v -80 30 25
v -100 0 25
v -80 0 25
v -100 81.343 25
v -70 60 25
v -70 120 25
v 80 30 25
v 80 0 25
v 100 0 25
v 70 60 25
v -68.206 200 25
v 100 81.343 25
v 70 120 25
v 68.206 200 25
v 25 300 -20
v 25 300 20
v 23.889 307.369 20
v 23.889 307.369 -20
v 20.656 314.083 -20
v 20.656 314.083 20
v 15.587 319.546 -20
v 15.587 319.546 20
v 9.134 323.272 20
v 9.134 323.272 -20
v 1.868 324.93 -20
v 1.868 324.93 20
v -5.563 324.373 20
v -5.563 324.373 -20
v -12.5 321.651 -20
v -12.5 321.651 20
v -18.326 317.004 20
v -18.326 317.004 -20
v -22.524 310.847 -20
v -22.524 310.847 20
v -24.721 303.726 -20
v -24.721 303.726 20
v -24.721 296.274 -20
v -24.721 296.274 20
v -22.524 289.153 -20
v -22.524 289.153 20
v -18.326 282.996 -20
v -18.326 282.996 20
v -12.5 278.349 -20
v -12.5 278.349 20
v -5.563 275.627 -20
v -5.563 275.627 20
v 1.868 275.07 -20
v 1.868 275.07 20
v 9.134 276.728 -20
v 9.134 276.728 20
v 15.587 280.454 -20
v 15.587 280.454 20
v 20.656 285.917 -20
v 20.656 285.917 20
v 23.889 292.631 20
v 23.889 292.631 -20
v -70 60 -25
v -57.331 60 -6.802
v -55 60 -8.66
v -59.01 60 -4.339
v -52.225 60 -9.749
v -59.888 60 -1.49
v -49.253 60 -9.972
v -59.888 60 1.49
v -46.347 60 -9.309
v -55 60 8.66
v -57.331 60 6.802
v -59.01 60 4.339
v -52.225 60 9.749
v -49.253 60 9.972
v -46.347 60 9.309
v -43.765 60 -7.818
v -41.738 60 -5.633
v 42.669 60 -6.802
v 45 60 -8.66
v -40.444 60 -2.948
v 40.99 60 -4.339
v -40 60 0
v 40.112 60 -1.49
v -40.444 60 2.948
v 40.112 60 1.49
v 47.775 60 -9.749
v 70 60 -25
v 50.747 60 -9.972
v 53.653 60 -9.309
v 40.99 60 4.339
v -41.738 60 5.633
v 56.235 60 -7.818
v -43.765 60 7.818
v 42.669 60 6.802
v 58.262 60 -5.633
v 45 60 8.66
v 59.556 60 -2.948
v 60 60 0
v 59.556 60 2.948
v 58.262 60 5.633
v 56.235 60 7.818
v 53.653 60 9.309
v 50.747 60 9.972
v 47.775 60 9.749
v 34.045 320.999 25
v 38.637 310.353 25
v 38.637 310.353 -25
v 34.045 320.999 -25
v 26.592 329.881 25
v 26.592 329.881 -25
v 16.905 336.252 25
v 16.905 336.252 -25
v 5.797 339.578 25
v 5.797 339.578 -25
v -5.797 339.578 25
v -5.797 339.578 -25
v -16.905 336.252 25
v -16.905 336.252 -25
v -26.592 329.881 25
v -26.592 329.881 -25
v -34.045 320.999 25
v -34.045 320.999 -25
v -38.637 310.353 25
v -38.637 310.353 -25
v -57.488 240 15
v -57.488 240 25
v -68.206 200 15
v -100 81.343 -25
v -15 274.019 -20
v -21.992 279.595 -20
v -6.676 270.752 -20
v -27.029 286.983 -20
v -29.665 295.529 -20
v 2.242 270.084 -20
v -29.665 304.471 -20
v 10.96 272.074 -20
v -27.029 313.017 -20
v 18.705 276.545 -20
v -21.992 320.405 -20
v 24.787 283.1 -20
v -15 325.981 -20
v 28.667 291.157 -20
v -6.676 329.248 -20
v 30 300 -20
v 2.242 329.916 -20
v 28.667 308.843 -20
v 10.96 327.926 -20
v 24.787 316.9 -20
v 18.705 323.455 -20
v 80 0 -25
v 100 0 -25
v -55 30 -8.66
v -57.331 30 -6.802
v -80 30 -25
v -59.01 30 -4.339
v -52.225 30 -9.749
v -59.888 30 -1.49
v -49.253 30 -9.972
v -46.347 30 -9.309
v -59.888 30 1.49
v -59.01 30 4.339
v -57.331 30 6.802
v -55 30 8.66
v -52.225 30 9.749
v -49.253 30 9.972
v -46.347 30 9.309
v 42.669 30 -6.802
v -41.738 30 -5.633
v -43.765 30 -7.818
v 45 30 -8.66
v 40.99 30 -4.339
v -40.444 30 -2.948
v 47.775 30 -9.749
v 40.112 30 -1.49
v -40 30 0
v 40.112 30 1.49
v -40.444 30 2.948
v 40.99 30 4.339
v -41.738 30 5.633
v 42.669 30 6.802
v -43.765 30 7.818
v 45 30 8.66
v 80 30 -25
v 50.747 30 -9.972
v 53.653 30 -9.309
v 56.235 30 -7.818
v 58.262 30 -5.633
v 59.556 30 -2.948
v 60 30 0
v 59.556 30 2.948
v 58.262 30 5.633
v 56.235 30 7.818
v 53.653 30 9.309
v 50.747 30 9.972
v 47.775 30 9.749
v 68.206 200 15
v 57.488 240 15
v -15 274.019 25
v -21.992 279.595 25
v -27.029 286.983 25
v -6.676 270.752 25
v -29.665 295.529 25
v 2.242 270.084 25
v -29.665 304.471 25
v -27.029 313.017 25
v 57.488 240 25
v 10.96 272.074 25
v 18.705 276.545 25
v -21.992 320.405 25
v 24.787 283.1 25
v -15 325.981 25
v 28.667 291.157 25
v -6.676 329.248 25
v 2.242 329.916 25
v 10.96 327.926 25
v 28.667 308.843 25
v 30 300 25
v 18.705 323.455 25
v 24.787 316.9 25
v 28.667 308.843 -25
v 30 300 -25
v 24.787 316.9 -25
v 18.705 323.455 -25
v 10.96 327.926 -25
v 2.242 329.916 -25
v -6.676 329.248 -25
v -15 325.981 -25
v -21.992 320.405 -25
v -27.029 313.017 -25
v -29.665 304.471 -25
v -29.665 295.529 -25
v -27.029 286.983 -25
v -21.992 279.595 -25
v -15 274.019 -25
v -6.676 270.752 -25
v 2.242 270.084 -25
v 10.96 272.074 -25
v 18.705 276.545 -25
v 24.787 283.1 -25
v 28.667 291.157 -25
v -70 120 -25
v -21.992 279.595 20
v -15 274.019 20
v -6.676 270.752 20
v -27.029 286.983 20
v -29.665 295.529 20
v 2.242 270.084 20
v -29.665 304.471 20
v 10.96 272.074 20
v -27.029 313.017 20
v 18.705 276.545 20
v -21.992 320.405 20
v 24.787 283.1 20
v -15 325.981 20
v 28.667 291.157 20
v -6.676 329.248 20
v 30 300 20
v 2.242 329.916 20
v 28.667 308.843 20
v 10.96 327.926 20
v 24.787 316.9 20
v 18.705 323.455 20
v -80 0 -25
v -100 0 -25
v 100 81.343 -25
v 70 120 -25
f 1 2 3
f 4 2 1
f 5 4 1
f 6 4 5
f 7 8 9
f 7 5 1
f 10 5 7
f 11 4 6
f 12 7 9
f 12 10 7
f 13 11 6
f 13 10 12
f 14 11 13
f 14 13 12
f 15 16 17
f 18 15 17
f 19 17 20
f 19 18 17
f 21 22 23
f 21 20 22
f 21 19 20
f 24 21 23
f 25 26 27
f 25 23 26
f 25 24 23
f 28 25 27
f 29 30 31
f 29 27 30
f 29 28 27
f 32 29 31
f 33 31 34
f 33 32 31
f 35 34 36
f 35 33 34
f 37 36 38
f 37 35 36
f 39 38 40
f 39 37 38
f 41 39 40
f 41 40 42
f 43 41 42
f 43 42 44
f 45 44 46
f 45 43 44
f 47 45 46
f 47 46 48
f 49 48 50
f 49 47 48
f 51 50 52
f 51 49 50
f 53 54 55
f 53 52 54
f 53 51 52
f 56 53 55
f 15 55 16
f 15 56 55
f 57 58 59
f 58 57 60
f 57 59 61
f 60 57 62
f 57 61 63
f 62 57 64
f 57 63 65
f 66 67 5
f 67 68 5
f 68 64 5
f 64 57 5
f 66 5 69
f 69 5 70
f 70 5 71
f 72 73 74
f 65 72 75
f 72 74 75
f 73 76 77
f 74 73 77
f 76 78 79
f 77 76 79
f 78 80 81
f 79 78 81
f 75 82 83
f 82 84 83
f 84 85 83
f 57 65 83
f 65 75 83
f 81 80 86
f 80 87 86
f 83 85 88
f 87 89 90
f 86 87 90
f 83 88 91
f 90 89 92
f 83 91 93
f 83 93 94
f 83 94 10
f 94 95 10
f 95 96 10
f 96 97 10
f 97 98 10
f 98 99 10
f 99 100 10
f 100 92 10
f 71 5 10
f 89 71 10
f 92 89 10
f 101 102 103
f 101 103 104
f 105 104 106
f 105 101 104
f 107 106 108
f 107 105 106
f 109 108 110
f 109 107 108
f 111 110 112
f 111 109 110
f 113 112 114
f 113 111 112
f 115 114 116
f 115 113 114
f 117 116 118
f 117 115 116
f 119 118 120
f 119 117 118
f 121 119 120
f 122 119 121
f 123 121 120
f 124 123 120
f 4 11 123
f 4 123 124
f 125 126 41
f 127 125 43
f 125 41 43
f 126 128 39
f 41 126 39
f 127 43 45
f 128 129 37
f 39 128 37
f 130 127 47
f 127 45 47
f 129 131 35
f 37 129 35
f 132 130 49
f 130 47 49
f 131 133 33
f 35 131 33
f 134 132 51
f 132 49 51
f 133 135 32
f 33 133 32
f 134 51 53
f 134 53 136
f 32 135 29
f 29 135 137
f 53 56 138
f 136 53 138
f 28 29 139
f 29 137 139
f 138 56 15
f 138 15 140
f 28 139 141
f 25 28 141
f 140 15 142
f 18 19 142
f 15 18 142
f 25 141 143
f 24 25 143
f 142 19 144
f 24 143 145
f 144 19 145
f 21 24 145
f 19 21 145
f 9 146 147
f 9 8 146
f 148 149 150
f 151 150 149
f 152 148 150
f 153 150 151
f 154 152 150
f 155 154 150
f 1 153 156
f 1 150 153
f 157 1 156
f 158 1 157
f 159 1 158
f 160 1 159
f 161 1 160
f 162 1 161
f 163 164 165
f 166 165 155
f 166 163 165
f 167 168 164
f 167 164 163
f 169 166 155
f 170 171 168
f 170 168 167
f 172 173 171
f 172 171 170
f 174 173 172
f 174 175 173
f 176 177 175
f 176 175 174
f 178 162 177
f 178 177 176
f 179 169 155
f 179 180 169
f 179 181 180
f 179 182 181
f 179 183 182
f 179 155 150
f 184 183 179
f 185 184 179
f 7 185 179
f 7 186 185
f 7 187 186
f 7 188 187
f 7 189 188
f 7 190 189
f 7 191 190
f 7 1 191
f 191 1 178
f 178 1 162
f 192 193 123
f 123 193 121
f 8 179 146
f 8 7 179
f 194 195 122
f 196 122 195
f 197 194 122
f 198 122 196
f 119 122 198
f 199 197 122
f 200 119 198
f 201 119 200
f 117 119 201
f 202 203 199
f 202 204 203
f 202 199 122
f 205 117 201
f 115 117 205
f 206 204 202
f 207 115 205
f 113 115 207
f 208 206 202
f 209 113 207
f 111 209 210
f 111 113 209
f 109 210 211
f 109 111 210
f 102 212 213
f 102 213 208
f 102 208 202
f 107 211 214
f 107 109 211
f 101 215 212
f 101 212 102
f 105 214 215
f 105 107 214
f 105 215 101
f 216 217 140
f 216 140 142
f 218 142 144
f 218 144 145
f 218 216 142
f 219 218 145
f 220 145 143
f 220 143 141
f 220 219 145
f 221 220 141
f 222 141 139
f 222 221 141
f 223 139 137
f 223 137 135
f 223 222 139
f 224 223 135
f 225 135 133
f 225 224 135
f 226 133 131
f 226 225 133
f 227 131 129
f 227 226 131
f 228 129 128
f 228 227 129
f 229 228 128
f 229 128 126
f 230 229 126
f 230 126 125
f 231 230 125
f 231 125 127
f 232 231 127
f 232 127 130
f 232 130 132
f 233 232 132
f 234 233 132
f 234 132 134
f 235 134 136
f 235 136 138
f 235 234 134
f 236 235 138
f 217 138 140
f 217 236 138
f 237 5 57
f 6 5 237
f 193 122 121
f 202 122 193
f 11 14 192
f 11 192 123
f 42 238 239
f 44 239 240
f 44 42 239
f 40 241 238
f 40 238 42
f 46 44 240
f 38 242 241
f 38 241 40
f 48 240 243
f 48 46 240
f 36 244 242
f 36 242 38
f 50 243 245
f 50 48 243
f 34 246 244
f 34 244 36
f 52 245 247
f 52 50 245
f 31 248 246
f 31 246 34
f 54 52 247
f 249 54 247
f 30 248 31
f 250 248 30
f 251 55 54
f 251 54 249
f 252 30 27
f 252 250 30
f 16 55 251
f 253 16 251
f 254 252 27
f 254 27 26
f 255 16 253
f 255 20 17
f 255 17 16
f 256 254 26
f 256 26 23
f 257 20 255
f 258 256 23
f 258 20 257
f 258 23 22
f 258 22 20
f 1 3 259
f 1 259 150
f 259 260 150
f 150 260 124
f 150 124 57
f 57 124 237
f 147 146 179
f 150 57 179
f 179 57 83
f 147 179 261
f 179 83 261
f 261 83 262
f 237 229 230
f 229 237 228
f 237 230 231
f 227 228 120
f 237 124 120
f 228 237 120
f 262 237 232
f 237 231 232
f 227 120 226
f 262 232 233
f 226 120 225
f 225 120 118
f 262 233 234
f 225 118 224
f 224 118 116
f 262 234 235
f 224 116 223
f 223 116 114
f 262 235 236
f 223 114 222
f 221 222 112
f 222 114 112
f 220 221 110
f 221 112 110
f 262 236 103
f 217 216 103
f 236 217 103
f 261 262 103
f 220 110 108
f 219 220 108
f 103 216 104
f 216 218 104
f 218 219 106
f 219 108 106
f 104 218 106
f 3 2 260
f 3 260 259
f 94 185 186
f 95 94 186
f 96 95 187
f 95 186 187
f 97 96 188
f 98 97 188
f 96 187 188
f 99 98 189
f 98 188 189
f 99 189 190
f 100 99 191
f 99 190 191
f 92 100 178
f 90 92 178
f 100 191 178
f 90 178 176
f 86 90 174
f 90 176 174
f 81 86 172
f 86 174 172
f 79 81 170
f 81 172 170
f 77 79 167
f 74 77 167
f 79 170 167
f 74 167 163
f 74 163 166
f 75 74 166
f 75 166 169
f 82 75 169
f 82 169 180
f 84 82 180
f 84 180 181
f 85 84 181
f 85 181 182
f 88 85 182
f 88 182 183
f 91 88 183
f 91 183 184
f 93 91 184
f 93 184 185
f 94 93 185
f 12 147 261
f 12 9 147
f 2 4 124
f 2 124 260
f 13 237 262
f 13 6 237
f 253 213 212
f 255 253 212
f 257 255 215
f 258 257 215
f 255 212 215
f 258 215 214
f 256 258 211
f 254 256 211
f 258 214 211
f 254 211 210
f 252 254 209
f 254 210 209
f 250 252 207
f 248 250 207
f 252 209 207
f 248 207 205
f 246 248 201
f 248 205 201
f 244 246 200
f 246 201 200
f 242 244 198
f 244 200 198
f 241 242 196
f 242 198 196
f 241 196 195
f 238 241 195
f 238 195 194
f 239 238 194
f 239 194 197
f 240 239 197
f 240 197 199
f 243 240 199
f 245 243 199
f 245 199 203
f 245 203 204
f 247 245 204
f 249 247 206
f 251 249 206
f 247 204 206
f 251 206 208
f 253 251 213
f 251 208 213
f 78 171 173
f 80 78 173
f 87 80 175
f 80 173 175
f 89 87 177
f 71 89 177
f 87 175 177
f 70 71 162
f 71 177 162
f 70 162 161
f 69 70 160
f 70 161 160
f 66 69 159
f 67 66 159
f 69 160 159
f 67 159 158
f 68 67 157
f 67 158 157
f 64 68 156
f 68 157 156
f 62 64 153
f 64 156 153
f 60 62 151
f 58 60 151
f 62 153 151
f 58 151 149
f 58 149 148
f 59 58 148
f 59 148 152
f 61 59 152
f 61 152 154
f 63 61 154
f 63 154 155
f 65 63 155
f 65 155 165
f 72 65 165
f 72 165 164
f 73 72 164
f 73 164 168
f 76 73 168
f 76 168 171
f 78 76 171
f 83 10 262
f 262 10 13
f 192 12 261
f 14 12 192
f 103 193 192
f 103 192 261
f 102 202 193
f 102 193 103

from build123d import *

# Parameters (mm, degrees)
SKETCH1_R           = 25
SKETCH1_W           = 140
SKETCH1_H           = 60
BOSS_EXTRUDE1_DEPTH = 25
SKETCH4_R           = 30
CUT_EXTRUDE1_DEPTH  = 5
CUT_EXTRUDE2_DEPTH  = 10
CUT_EXTRUDE3_REACH  = 312
SKETCH6_R           = 10


with BuildPart() as part:
    # Sketch1 → Boss-Extrude1 (new body, symmetric)
    with BuildSketch(Plane.XY):
        with BuildLine():
            Line((100, 81.343051449), (38.637033052, 310.352761804))
            ThreePointArc((38.637033052, 310.352761804), (0, 340), (-38.637033052, 310.352761804))
            Line((-38.637033052, 310.352761804), (-100, 81.343051449))
            Line((-100, 81.343051449), (-100, 0))
            Line((-100, 0), (-80, 0))
            Line((-80, 0), (-80, 30))
            Line((-80, 30), (80, 30))
            Line((80, 30), (80, 0))
            Line((80, 0), (100, 0))
            Line((100, 0), (100, 81.343051449))
        make_face()
        with Locations((0, 300)):
            Circle(SKETCH1_R, mode=Mode.SUBTRACT)
        with Locations((0, 90)):
            Rectangle(SKETCH1_W, SKETCH1_H, mode=Mode.SUBTRACT)
    extrude(amount=BOSS_EXTRUDE1_DEPTH, both=True)

    # Sketch4 → Cut-Extrude1 (cut)
    with BuildSketch(Plane.XY.offset(25)):
        with Locations((0, 300)):
            Circle(SKETCH4_R)
    cut_extrude1 = extrude(amount=-CUT_EXTRUDE1_DEPTH, mode=Mode.SUBTRACT)

    # Mirror1: Cut-Extrude1 across plane
    add(cut_extrude1.mirror(Plane.XY), mode=Mode.SUBTRACT)

    # Sketch5 → Cut-Extrude2 (cut)
    with BuildSketch(Plane.XY.offset(25)):
        Polygon((-57.487998762, 240), (57.487998762, 240), (68.20596646, 200), (-68.20596646, 200), align=None)
    extrude(amount=-CUT_EXTRUDE2_DEPTH, mode=Mode.SUBTRACT)

    # Sketch6 → Cut-Extrude3 (cut, up to next)
    with BuildSketch(Plane.XZ.offset(-30), mode=Mode.PRIVATE) as cut_extrude3_sk1:
        with Locations((-50, 0)):
            Circle(SKETCH6_R)
    cut_extrude3_tool1 = extrude(cut_extrude3_sk1.sketch, amount=-CUT_EXTRUDE3_REACH, mode=Mode.PRIVATE) & part.part
    add(cut_extrude3_tool1.solids().sort_by_distance((-50, 30, 0))[0], mode=Mode.SUBTRACT)
    # Sketch6 → Cut-Extrude3 (cut, up to next)
    with BuildSketch(Plane.XZ.offset(-30), mode=Mode.PRIVATE) as cut_extrude3_sk2:
        with Locations((50, 0)):
            Circle(SKETCH6_R)
    cut_extrude3_tool2 = extrude(cut_extrude3_sk2.sketch, amount=-CUT_EXTRUDE3_REACH, mode=Mode.PRIVATE) & part.part
    add(cut_extrude3_tool2.solids().sort_by_distance((50, 30, 0))[0], mode=Mode.SUBTRACT)


solid = part.part
